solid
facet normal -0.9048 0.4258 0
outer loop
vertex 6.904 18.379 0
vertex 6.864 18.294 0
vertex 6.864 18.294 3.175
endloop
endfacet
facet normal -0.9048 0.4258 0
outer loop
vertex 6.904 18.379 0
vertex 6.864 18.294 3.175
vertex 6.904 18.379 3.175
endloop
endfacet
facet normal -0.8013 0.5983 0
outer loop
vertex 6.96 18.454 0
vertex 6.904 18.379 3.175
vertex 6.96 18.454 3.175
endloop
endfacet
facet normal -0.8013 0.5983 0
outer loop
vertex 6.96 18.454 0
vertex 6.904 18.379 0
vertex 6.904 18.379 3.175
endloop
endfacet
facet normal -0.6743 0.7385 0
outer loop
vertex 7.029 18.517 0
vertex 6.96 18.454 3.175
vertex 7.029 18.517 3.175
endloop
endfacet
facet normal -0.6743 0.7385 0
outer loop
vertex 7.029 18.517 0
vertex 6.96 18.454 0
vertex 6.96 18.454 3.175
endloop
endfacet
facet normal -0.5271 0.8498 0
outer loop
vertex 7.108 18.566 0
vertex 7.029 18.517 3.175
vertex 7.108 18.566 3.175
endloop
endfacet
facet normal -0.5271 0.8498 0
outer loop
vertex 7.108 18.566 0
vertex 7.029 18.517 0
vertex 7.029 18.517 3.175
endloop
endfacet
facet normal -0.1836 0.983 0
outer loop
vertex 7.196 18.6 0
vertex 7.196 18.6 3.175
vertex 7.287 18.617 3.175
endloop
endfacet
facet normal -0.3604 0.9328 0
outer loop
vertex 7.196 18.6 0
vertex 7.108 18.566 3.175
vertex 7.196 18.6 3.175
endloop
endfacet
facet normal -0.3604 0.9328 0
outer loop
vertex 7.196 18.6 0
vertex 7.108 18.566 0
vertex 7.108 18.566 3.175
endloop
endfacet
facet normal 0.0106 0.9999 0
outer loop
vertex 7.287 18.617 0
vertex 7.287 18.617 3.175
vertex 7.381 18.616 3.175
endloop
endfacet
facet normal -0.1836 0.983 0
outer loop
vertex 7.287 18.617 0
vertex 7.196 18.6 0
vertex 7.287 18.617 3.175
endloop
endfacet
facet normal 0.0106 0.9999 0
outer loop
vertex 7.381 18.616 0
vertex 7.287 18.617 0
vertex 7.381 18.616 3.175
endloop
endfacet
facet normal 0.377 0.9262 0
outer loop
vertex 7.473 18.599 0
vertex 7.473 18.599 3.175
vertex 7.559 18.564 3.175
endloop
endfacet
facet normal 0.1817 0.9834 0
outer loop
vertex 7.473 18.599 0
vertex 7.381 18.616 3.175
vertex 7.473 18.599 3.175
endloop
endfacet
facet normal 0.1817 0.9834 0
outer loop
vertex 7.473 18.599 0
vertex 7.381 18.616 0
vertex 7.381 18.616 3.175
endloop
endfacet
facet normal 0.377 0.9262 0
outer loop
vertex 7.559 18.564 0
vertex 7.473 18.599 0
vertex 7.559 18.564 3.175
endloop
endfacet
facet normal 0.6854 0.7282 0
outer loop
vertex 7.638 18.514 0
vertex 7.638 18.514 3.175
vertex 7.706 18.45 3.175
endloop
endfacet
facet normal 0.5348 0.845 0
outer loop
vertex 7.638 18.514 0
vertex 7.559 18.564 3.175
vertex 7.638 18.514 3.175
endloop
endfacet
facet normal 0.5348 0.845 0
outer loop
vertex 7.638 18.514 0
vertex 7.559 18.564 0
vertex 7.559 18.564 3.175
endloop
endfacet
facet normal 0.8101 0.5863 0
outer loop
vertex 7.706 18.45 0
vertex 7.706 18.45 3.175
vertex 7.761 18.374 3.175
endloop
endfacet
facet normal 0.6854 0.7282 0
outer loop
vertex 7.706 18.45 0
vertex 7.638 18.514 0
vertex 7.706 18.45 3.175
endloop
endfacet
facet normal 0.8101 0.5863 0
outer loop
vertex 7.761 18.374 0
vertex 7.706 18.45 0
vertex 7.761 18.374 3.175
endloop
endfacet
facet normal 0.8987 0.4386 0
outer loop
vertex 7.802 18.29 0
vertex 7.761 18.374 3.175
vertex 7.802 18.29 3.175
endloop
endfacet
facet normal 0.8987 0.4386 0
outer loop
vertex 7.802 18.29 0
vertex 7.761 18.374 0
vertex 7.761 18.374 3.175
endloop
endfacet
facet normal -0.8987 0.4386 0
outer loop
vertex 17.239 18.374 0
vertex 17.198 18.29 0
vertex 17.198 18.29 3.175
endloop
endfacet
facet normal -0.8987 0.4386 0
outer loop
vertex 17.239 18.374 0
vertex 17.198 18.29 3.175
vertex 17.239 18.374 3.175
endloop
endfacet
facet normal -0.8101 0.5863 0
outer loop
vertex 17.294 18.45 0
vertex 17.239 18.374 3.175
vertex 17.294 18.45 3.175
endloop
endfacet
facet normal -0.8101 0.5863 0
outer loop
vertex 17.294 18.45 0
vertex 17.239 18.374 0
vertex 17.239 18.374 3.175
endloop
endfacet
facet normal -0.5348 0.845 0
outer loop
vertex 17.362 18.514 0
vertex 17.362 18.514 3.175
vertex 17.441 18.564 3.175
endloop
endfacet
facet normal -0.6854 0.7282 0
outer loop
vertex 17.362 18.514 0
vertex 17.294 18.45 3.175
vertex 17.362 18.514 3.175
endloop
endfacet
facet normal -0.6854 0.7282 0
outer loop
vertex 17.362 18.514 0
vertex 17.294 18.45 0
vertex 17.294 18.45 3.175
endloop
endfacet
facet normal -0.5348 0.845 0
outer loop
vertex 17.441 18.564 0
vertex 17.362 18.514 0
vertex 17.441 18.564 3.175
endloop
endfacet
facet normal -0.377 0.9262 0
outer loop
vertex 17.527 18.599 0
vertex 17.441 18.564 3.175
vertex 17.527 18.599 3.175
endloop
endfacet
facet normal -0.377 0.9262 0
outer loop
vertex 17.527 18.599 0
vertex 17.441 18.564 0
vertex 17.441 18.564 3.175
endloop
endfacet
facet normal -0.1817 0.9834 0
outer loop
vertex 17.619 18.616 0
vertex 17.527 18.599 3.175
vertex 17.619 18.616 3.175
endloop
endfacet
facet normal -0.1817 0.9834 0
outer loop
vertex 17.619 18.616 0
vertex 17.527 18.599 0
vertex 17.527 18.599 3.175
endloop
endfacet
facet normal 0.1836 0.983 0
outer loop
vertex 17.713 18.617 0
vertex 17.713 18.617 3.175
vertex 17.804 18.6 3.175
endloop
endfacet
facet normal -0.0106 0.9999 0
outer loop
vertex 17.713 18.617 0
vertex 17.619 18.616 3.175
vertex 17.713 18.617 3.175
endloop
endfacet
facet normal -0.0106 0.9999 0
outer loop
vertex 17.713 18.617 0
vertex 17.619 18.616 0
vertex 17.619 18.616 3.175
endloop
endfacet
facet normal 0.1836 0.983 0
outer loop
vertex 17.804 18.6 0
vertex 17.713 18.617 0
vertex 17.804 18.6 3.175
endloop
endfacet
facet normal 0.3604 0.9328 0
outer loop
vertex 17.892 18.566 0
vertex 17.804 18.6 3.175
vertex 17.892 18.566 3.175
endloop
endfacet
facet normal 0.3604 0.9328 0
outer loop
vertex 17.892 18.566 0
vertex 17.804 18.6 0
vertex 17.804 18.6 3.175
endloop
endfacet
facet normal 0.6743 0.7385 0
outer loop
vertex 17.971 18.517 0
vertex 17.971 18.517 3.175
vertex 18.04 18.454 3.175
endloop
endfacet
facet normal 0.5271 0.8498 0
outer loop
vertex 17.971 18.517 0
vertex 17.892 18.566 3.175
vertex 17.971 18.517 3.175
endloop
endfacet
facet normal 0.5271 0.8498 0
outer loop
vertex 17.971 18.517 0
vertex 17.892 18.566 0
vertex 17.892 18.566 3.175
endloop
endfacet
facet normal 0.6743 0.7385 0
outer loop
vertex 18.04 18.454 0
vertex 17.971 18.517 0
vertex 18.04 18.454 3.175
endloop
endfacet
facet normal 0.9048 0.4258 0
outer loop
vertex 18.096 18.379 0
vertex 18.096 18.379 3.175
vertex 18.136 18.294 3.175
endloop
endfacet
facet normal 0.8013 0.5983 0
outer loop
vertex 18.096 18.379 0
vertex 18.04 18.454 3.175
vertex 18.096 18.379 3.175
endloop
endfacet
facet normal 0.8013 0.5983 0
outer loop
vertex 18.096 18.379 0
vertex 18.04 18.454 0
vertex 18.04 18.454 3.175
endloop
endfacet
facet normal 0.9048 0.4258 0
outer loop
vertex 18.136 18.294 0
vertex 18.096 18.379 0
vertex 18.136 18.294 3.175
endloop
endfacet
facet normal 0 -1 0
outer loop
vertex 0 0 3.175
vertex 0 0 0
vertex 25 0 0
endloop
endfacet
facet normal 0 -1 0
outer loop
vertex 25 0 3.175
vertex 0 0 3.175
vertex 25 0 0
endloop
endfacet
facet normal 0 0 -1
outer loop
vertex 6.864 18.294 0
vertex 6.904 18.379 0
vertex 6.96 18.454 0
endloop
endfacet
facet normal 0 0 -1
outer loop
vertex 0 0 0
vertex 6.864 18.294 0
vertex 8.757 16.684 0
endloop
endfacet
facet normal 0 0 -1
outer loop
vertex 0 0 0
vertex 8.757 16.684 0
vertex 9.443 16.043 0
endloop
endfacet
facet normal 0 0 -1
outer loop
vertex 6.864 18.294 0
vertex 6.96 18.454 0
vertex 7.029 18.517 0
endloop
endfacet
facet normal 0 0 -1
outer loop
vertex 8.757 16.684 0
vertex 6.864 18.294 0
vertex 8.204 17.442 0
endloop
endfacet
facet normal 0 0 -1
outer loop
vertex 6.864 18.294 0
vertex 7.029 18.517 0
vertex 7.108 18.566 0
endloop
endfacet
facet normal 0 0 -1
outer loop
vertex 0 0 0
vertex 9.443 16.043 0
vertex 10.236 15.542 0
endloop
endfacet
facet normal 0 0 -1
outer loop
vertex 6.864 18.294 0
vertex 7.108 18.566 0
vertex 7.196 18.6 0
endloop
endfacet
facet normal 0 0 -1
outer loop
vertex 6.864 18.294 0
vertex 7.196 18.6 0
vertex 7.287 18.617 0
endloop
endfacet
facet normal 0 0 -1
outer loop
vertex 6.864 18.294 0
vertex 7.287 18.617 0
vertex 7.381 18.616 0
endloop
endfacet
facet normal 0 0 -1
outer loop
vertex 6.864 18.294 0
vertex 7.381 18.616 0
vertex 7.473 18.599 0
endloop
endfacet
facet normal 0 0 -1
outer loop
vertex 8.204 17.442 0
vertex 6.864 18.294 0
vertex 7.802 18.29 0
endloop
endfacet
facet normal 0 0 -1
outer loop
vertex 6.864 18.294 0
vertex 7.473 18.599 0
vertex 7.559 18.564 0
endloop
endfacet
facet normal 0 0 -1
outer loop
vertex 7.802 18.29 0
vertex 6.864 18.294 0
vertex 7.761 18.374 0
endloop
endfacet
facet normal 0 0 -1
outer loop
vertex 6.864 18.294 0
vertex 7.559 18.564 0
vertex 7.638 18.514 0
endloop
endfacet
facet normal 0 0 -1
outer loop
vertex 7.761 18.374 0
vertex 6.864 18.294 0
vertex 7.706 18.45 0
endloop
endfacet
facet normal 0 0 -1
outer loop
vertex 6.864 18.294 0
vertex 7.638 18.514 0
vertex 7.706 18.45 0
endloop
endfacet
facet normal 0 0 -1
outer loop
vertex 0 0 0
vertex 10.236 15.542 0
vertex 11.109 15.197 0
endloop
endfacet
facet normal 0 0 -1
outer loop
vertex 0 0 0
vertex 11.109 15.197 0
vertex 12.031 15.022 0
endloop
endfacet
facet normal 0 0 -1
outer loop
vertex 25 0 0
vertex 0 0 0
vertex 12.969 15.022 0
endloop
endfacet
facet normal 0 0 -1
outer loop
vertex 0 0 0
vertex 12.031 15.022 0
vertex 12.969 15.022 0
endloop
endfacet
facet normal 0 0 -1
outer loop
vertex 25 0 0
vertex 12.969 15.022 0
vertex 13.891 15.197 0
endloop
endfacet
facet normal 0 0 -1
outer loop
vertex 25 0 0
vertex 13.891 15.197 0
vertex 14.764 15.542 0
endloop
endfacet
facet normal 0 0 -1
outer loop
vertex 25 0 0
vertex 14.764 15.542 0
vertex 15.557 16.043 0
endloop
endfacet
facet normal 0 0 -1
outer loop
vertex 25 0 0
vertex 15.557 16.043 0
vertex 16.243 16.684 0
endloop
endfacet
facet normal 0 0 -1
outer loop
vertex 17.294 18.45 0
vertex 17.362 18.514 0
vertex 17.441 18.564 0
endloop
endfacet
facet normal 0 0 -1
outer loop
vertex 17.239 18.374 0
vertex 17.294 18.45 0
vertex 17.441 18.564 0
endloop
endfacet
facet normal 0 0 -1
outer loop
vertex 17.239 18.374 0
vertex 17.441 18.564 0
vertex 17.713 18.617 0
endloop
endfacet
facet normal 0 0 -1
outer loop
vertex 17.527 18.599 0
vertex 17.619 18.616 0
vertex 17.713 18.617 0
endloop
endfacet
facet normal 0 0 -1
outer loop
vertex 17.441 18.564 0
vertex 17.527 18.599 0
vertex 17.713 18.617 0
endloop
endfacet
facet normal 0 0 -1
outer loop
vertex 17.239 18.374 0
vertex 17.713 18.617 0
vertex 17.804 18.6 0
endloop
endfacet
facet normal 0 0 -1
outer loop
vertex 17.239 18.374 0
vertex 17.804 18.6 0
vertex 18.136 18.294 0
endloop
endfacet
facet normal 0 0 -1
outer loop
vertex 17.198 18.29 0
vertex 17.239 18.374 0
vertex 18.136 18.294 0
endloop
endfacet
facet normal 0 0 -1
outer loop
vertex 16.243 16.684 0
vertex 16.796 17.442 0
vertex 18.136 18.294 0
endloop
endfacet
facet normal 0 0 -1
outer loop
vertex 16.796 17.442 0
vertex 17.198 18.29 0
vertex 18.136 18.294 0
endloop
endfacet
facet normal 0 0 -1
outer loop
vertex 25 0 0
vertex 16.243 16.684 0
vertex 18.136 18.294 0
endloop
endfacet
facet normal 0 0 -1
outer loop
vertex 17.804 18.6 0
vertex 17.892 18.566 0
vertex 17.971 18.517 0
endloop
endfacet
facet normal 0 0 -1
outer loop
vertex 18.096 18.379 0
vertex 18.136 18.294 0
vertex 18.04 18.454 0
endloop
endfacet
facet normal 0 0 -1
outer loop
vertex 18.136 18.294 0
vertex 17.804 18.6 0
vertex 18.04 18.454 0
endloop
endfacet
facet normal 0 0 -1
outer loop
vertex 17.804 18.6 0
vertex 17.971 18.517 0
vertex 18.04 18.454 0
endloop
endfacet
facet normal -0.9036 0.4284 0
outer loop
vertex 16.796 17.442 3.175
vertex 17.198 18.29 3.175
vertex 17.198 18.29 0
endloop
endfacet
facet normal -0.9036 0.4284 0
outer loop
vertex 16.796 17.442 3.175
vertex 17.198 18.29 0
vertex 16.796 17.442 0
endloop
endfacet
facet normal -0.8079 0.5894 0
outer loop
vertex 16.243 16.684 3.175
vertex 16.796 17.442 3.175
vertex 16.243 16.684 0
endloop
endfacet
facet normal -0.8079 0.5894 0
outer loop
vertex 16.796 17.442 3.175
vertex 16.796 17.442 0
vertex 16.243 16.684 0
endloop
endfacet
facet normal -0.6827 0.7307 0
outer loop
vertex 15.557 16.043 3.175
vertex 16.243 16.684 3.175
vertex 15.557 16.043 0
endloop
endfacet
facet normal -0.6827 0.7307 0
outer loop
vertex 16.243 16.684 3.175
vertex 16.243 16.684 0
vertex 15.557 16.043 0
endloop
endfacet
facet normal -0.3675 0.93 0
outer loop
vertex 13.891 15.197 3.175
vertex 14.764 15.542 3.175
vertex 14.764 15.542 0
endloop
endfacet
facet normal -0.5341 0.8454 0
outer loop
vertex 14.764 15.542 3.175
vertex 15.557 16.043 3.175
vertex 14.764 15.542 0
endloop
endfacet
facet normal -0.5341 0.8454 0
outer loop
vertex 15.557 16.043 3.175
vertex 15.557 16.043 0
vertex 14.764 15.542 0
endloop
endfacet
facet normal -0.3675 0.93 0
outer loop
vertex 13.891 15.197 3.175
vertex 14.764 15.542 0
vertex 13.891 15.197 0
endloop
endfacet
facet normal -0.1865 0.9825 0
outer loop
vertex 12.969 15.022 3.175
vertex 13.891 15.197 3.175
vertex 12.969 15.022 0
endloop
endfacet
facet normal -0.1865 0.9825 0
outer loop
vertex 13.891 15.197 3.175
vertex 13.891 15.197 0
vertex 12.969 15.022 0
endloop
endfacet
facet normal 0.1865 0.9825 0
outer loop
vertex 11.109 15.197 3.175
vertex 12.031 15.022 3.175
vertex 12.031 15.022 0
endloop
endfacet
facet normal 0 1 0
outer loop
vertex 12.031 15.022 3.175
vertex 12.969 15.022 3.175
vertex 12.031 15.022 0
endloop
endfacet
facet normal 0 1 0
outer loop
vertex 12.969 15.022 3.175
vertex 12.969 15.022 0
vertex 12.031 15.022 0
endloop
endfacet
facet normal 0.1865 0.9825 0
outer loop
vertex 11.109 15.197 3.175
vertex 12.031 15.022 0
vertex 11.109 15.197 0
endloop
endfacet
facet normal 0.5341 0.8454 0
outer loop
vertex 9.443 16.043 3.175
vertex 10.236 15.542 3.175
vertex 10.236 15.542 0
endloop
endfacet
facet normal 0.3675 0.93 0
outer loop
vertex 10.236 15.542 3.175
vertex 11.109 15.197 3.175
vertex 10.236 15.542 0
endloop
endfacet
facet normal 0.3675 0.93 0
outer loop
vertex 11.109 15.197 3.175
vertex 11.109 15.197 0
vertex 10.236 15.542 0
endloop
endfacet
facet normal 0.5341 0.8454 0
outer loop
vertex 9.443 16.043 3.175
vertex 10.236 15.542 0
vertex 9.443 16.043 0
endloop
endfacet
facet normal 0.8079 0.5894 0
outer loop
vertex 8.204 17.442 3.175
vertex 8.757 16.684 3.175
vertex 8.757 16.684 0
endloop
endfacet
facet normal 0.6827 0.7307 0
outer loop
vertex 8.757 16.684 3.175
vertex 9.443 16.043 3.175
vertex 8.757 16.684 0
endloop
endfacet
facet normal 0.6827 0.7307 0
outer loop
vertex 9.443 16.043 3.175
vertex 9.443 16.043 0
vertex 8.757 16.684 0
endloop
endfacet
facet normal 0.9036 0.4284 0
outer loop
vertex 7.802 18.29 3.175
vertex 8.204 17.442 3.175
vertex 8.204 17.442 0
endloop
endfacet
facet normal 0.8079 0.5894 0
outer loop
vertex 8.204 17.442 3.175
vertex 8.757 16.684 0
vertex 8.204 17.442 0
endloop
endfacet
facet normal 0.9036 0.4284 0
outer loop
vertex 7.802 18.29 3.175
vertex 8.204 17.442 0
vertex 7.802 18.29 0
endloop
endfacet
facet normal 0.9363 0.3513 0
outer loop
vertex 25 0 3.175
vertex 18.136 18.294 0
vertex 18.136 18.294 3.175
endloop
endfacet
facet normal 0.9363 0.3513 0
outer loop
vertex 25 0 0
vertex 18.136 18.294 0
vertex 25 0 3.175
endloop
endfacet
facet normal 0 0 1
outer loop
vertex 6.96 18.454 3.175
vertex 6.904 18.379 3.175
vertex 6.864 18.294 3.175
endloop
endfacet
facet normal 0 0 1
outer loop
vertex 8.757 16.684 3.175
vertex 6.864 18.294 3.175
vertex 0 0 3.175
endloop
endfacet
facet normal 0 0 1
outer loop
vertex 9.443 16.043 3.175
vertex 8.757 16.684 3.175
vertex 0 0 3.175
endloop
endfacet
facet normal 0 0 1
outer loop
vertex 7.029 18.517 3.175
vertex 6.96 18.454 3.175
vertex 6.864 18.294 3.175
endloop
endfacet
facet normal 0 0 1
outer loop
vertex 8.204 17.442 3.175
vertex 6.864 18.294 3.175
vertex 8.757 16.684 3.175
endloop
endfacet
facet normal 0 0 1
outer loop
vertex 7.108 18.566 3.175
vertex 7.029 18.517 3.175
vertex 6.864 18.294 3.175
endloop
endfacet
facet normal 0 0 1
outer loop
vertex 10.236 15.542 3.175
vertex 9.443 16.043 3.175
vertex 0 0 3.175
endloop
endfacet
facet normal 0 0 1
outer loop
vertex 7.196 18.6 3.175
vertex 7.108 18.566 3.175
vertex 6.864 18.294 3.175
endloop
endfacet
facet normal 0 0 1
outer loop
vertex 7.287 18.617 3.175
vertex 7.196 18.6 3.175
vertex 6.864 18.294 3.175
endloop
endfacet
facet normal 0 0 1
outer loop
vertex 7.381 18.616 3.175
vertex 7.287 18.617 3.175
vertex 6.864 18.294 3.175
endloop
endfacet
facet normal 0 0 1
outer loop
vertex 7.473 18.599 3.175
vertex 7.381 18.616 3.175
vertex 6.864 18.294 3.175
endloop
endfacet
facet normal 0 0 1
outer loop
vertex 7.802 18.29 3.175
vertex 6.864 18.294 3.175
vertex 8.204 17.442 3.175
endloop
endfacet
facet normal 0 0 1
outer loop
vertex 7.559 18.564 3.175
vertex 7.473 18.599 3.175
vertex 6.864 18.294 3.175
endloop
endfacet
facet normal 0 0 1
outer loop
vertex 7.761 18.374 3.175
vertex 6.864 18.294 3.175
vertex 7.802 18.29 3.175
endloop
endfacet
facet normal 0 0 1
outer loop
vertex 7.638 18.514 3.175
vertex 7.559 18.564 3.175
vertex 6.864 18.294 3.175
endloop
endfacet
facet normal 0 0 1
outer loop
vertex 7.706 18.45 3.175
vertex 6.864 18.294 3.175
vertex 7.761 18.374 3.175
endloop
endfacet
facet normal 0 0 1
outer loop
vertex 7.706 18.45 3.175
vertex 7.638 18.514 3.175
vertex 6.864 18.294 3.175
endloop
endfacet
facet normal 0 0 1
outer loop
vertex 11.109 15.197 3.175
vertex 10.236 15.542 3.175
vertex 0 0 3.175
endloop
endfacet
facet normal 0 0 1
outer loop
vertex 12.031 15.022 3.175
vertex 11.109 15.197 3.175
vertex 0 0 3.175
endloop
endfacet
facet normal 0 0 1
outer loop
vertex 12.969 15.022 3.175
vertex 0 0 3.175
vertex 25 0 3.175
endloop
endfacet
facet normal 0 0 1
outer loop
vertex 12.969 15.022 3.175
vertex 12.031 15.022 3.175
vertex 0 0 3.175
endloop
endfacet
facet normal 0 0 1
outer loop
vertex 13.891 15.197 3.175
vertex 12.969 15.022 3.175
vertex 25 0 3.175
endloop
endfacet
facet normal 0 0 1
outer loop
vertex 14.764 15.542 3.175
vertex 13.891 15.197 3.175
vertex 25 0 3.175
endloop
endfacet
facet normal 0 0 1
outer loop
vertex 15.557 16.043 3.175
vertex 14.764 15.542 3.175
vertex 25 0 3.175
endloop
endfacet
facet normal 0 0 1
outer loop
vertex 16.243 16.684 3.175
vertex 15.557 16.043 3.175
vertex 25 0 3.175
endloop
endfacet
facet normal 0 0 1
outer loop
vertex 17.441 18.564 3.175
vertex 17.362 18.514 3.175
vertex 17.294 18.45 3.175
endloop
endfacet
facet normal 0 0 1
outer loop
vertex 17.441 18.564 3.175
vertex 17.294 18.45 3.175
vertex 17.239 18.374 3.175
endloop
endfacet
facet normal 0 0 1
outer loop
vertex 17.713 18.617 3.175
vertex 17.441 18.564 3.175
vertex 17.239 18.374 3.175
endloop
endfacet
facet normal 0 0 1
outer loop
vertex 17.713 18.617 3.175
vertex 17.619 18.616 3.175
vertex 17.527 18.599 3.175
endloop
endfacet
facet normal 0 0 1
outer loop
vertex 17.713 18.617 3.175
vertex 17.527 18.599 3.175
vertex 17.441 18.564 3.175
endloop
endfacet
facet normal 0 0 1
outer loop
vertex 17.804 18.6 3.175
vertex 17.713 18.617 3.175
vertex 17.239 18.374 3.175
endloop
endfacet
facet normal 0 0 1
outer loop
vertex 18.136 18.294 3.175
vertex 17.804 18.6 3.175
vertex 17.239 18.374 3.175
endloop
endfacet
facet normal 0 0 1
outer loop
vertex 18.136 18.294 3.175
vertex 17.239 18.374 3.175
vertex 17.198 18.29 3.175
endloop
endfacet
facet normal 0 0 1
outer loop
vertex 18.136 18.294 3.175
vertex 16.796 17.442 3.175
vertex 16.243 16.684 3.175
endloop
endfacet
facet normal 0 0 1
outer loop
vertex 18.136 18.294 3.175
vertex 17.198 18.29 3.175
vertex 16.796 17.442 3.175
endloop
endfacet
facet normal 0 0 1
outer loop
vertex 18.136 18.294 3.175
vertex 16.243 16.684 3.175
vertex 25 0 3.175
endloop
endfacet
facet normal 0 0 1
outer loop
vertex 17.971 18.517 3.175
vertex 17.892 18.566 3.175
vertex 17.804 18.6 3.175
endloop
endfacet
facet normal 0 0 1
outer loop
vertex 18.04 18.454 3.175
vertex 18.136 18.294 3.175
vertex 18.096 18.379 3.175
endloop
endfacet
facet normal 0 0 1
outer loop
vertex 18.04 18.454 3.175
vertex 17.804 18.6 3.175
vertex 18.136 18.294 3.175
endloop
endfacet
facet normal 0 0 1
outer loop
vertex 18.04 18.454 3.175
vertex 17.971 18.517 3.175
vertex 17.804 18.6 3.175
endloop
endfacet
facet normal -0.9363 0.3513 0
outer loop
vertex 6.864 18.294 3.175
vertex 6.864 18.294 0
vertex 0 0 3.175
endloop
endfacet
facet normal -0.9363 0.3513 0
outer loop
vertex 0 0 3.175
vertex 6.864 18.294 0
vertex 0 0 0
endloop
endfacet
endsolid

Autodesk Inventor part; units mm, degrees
ref_plane "YZ Plane" through (0, 0, 0) normal (1, 0, 0) x (0, 1, 0)
ref_plane "XZ Plane" through (0, 0, 0) normal (0, 1, 0) x (-1, 0, 0)
ref_plane "XY Plane" through (0, 0, 0) normal (0, 0, 1) x (1, 0, 0)
sketch "Sketch1" plane through (0, 0, 0) normal (0, 0, 1) x (1, 0, 0)
  line L0 (0, 0) -> (25, 0)
  arc A0 (7.8015, 18.2899) -> (17.1985, 18.2899) centre (12.5, 20) ccw
  line L1 (18.1364, 18.2945) -> (25, 0)
  line L2 (6.8636, 18.2945) -> (0, 0)
  arc A1 (7.8015, 18.2899) -> (6.8636, 18.2945) centre (7.3317, 18.1189) ccw
  arc A2 (18.1364, 18.2945) -> (17.1985, 18.2899) centre (17.6683, 18.1189) ccw
  dimension "d0" = 5
  dimension "d1" = 20
  dimension "d2" = 25
  dimension "d4" = 20
  dimension "d9" = 0.5
extrude "Extrusion1" add sketch "Sketch1" along normal blind 3.175
equation "\"d5\" = THICKA"
equation "\"THICKA\" = 3.175"
equation "\"THICKB\" = 6.731"
equation "\"THICKC\" = 12.7"
equation "\"MAGDIA\" = 9.5"
equation "\"BALLDIA\" = 12"
properties part number "Air2D_Shaft_Brace"
